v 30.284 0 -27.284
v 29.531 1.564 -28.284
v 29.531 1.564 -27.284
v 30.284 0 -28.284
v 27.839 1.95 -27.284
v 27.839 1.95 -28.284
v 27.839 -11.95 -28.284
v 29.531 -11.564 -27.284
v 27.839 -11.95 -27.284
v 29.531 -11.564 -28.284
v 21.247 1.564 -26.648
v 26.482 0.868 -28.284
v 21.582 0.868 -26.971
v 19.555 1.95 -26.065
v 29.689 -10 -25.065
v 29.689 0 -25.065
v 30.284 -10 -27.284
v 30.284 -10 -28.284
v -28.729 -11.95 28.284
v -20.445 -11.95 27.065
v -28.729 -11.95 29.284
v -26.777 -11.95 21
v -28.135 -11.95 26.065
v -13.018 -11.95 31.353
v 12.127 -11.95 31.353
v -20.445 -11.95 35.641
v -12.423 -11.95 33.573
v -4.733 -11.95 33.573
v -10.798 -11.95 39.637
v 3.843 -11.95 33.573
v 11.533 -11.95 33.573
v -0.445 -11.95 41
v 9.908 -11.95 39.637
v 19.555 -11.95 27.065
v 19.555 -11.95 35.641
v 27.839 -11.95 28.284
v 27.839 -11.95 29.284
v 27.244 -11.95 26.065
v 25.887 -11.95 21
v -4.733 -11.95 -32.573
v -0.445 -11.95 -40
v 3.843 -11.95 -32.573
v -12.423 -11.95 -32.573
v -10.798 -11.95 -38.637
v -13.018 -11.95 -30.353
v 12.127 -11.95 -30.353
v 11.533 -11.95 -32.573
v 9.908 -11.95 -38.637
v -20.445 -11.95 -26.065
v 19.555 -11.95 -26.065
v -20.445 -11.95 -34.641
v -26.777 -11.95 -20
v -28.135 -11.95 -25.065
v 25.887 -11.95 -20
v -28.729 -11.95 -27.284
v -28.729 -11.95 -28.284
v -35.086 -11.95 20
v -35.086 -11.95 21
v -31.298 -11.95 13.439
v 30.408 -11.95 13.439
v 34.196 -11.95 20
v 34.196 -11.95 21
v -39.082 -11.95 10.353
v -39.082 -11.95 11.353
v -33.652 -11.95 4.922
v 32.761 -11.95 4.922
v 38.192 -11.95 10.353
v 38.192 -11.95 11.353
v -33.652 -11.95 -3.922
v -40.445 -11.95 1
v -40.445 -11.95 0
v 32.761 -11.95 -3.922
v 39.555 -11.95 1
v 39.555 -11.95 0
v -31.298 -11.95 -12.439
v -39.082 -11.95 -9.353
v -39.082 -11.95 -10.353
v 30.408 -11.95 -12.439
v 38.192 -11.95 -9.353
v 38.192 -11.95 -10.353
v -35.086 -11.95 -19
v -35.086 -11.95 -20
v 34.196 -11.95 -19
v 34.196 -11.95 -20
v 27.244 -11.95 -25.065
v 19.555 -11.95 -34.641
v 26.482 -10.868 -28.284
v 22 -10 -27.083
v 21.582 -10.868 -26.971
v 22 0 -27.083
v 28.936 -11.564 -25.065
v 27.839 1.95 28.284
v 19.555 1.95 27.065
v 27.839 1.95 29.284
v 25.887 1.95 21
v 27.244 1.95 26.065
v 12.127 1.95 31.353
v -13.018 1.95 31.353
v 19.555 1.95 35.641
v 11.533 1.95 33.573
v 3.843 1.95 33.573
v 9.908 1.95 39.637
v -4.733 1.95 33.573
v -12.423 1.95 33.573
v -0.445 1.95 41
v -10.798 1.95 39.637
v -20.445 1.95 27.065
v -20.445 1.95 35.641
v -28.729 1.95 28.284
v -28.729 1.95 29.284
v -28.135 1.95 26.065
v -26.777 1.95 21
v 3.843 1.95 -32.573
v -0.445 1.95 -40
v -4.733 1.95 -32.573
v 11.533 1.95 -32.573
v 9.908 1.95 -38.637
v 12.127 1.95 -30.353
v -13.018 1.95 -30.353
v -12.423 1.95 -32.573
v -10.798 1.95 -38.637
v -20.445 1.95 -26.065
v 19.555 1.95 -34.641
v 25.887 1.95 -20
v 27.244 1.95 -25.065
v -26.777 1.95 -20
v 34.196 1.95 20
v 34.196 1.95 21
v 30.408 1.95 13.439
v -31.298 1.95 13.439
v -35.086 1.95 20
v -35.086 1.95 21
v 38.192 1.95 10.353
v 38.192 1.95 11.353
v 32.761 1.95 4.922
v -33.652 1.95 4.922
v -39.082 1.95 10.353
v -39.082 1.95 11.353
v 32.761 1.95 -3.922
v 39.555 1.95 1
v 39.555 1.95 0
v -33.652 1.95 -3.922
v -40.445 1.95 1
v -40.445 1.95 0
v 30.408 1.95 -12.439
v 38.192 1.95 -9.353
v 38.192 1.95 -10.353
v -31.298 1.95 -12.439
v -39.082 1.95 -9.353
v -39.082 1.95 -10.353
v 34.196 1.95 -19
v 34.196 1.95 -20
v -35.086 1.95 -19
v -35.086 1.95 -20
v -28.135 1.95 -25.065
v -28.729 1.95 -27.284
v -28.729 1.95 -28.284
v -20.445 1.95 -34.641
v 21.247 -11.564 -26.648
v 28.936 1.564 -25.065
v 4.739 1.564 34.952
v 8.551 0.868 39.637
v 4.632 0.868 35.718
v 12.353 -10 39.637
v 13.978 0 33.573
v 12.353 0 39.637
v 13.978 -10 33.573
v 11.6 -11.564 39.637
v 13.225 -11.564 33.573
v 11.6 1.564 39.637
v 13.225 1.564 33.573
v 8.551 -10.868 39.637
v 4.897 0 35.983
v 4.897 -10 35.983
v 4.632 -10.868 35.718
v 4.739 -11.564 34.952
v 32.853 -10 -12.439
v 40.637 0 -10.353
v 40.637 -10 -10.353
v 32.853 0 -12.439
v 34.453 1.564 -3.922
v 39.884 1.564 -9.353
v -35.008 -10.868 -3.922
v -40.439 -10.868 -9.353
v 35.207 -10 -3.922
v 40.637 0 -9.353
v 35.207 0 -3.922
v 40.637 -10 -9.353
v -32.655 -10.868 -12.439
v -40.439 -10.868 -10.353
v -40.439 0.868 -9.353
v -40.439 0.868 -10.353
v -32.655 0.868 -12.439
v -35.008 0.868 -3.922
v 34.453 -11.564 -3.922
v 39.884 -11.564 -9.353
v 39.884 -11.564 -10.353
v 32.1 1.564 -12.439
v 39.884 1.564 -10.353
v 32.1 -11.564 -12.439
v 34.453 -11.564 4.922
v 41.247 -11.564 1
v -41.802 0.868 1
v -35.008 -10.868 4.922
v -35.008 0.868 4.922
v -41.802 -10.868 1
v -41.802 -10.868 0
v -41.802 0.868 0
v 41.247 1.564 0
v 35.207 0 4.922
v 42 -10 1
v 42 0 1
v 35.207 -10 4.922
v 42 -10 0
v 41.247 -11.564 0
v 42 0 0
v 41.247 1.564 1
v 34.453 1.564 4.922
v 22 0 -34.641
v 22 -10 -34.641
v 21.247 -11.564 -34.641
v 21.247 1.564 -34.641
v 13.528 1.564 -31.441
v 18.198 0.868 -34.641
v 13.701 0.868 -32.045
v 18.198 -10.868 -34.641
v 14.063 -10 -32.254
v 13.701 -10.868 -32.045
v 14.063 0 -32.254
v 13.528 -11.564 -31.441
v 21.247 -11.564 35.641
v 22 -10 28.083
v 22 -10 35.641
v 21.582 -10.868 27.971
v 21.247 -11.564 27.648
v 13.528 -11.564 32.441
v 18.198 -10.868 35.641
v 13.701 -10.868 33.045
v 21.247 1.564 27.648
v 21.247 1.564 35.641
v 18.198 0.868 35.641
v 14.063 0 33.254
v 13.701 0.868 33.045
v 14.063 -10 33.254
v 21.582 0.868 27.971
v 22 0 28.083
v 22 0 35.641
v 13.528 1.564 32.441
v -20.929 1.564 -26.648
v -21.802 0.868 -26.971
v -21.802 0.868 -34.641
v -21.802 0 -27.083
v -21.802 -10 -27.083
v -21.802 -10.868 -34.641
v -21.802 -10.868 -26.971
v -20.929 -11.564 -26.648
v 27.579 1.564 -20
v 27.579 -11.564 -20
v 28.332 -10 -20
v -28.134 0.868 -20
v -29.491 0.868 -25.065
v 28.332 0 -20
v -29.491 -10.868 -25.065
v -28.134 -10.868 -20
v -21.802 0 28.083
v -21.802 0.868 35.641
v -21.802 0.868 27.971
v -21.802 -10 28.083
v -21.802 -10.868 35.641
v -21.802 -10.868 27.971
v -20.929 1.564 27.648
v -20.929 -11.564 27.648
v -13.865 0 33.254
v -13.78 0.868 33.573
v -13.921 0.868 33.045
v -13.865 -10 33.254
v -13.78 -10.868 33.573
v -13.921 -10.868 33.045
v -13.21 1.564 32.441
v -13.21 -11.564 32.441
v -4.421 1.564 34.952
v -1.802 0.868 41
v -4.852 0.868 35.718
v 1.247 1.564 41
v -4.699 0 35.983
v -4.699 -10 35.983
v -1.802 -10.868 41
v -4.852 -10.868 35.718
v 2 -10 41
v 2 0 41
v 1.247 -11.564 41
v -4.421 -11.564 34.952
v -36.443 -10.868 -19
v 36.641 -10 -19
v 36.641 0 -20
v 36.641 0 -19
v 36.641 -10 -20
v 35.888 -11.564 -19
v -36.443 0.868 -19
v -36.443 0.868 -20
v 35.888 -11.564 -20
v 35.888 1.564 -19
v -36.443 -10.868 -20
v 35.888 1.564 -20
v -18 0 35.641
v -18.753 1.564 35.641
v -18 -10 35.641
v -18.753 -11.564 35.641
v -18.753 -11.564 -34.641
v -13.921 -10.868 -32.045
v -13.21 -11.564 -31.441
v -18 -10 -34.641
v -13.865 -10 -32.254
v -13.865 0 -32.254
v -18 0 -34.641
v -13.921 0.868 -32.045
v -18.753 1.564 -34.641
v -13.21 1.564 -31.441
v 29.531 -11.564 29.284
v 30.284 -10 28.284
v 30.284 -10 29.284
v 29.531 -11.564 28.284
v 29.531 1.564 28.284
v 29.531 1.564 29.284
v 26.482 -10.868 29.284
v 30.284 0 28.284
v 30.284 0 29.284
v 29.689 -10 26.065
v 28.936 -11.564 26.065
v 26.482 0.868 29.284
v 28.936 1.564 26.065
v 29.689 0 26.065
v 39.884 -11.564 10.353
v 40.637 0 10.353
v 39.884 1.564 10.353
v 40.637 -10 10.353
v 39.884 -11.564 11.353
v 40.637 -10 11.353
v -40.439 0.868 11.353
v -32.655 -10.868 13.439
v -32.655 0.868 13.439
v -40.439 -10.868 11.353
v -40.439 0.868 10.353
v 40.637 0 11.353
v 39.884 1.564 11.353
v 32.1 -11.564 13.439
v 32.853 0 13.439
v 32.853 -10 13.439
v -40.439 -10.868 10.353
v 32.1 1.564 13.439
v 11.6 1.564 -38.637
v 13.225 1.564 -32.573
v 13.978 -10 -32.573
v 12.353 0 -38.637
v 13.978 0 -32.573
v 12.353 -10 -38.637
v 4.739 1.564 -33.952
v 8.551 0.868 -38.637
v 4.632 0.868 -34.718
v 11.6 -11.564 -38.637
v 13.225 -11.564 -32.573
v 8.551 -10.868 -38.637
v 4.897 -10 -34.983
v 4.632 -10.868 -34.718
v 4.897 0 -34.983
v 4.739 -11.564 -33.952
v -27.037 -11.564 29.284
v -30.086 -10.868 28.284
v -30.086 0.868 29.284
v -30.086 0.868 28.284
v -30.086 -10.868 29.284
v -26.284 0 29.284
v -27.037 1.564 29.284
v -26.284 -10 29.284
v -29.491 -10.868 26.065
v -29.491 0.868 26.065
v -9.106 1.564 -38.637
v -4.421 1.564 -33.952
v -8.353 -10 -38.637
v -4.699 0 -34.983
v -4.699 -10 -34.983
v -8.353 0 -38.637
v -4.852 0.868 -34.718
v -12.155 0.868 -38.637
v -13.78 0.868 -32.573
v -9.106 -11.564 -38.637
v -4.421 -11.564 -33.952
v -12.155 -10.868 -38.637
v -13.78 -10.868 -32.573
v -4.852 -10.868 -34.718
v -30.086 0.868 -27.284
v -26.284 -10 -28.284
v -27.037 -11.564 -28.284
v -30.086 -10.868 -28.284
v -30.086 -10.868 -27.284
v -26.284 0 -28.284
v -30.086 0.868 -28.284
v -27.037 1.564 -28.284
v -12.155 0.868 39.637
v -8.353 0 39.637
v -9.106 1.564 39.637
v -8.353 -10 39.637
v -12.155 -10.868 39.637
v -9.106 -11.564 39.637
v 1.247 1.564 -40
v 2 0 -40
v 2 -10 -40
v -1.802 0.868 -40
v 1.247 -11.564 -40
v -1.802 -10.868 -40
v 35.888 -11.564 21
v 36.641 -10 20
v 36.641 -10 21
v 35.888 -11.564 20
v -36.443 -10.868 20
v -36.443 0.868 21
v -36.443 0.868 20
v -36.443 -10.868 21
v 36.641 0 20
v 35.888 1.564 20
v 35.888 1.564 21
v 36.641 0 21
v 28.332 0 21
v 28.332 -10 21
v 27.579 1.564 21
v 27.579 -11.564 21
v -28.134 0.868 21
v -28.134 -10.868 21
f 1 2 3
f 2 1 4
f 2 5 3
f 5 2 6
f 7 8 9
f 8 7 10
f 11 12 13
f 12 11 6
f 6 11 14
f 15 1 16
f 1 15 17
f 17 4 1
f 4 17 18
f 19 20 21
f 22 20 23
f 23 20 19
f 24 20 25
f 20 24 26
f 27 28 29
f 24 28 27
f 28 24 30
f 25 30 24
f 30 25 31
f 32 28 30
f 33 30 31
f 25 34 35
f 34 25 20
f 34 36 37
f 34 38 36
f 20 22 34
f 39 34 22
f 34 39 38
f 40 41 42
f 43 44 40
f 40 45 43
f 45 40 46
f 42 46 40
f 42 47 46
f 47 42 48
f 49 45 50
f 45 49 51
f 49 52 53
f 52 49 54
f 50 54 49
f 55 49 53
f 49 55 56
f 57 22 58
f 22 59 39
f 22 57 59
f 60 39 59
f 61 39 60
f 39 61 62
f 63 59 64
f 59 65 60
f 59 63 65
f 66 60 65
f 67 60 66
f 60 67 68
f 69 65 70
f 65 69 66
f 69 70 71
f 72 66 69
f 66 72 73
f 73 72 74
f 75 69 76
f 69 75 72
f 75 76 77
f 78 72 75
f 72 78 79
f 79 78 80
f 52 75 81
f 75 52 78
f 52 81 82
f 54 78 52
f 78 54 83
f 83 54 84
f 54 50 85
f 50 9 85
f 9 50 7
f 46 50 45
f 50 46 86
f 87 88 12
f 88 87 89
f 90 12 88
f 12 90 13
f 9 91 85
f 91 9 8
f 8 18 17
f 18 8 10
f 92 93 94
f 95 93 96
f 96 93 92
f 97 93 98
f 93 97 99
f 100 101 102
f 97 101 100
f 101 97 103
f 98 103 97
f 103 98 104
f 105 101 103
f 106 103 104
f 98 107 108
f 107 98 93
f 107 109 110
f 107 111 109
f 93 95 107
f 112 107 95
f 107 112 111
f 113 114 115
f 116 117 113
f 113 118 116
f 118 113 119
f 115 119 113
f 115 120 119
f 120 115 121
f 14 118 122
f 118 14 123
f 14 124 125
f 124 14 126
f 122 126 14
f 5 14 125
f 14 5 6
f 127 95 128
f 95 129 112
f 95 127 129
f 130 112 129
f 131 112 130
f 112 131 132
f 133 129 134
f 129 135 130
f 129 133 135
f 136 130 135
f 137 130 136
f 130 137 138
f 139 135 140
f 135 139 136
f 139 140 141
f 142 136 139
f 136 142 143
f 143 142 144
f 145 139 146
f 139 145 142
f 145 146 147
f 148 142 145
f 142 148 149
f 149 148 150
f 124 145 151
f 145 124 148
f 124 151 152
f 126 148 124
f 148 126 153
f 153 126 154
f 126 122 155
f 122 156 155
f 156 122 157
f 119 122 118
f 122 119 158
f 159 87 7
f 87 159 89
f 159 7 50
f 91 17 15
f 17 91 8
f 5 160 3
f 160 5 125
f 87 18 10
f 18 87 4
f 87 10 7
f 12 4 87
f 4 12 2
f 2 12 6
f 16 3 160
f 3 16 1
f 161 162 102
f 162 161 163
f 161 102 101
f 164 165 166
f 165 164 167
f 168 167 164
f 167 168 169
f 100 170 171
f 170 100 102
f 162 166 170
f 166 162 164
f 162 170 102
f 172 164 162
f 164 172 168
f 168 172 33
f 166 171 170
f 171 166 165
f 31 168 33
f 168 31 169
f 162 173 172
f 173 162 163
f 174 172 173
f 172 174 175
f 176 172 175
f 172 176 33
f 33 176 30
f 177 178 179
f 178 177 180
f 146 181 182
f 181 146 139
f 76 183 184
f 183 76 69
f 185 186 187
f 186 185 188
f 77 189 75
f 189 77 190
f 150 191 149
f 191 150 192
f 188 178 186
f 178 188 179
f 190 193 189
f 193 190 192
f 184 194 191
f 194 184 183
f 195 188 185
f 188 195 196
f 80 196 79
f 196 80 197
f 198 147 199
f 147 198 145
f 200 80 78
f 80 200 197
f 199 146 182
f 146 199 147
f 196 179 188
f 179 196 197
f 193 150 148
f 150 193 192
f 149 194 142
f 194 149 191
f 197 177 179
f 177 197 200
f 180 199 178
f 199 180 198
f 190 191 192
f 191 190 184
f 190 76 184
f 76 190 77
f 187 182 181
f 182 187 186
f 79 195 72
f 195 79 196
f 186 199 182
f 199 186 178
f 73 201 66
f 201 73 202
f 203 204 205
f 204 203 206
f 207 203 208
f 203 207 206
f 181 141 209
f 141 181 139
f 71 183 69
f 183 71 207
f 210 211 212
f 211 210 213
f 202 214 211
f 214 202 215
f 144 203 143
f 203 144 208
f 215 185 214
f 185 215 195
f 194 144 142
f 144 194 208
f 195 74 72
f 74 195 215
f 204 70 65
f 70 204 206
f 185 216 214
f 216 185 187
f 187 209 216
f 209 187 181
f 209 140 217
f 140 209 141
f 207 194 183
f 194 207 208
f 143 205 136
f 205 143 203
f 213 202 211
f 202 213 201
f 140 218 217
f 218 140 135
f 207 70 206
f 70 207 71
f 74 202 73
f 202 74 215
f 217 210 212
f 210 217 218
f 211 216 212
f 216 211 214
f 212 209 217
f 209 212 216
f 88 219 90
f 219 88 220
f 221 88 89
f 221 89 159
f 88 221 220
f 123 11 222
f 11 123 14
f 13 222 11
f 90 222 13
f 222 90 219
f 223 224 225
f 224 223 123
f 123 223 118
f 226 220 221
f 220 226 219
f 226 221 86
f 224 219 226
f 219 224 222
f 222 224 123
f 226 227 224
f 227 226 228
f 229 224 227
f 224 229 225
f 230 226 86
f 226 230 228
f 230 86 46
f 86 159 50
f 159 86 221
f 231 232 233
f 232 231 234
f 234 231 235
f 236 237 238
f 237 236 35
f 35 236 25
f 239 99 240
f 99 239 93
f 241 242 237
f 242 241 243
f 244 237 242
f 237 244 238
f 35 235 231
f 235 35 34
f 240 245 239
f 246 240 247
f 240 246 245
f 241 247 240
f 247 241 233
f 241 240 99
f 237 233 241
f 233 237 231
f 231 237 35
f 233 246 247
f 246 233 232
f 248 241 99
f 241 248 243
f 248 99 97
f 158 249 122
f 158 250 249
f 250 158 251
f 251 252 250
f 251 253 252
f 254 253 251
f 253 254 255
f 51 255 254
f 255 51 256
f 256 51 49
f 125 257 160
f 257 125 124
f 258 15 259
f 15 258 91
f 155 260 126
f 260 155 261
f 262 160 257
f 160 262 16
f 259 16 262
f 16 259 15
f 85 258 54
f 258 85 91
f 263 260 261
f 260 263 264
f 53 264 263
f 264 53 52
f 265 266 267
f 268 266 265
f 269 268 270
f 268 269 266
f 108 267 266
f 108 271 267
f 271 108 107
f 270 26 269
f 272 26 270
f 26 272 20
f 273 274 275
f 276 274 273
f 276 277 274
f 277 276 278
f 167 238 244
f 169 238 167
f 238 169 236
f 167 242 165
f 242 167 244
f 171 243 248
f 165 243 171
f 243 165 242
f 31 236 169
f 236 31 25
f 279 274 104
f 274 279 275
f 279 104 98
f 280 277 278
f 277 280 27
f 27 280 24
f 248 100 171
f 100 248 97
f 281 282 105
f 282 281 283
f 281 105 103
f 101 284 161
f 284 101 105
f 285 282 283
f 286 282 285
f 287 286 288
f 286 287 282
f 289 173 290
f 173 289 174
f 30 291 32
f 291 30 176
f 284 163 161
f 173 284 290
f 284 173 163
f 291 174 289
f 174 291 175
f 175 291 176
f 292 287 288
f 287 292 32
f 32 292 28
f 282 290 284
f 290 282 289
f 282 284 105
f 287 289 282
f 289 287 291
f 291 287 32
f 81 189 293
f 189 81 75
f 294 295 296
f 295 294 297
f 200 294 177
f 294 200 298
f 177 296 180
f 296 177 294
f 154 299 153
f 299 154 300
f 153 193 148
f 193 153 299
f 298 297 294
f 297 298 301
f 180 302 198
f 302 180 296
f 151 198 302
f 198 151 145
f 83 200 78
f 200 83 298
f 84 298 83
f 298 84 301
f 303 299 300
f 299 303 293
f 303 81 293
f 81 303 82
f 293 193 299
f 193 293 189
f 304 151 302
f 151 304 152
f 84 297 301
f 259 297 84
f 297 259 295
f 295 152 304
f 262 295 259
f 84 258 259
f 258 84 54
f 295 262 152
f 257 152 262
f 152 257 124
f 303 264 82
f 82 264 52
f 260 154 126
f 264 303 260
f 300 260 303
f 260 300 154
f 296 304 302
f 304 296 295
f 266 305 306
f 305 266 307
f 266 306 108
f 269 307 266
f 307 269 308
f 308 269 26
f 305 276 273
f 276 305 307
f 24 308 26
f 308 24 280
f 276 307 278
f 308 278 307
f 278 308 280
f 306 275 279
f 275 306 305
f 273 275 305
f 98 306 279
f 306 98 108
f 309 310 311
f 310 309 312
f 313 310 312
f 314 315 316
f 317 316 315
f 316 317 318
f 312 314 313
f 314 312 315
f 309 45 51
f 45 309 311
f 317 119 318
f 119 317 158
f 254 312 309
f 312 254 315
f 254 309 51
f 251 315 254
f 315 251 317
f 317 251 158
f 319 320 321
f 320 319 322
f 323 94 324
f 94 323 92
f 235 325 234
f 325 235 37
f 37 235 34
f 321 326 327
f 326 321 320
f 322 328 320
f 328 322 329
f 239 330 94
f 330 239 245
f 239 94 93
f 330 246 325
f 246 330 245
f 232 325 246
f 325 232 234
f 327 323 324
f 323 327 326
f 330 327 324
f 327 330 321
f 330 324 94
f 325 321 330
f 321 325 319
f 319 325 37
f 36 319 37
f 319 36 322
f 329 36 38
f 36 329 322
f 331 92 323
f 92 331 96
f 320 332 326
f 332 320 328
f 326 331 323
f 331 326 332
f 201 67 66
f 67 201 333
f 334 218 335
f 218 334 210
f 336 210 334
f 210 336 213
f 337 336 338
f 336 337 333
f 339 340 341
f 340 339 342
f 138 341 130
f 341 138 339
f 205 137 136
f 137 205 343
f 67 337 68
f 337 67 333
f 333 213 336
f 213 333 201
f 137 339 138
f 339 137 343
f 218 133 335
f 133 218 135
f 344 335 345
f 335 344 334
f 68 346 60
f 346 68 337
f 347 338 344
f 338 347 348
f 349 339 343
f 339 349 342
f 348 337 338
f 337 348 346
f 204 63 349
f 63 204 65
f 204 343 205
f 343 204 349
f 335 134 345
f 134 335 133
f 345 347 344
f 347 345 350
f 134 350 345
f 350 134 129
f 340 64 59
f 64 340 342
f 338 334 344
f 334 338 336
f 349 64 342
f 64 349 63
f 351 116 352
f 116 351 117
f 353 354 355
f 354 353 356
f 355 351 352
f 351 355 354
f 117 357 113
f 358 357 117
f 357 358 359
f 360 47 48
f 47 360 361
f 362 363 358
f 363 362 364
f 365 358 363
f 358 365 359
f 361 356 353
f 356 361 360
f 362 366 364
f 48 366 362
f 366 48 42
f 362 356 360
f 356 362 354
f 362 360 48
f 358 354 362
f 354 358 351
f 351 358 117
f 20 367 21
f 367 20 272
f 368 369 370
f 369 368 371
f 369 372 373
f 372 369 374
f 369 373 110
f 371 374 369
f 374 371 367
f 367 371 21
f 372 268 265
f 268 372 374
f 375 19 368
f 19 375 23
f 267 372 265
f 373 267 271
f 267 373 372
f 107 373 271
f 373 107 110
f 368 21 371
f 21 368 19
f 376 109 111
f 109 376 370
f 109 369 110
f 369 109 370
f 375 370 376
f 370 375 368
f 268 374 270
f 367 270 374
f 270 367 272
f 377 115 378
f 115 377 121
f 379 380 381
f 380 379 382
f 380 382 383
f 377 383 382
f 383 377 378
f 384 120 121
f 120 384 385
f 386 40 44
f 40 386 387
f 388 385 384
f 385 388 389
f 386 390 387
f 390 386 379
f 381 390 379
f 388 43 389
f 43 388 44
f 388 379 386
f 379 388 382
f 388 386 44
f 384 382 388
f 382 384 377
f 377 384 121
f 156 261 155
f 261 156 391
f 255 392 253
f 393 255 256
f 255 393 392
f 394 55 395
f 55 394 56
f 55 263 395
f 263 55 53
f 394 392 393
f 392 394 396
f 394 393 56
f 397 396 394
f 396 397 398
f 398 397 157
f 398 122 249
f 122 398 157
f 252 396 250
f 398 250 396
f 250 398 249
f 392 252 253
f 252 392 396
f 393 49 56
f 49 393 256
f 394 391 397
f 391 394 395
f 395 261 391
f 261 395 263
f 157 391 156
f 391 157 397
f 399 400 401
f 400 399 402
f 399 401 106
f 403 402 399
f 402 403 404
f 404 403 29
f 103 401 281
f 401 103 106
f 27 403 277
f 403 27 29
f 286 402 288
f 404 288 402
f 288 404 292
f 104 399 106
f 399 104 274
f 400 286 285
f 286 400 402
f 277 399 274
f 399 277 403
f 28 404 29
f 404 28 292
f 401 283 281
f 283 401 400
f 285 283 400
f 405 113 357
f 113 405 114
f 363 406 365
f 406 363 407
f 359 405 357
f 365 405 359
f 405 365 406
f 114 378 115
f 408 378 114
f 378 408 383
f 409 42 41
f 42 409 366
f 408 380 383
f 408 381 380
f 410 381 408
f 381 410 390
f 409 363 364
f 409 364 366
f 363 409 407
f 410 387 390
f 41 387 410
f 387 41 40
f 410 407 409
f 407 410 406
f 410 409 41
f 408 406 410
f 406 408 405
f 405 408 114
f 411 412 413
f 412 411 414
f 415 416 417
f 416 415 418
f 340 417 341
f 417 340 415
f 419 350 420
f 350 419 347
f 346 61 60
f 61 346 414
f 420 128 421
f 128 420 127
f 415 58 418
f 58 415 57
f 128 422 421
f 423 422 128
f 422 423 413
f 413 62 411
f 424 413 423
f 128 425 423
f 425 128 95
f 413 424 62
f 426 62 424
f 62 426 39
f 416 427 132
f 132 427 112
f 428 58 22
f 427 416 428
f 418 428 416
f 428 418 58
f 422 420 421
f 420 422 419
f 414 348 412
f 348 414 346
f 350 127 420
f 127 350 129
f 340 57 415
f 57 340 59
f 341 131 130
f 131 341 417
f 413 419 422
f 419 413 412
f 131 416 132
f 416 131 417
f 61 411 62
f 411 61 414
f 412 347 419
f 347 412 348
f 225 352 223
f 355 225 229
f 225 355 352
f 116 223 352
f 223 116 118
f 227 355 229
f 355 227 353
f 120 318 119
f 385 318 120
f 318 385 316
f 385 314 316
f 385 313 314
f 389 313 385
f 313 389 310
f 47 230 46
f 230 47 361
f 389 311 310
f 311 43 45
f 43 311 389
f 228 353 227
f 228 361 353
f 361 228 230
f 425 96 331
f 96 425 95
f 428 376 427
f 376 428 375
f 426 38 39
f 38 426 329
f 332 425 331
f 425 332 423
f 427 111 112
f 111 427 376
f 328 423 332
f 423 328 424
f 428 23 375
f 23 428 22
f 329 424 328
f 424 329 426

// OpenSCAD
minkowski(){
for(i = [0:45:365]){
//translate([30, 30, 10])
rotate([90,i,0])
cylinder(10,40,40,$fn=2);
}
cylinder(r=2,h=1);
}


//translate([30, 30, 10])
//rotate([0,-90,0])
//cylinder(20,20,20,$fn=2);
